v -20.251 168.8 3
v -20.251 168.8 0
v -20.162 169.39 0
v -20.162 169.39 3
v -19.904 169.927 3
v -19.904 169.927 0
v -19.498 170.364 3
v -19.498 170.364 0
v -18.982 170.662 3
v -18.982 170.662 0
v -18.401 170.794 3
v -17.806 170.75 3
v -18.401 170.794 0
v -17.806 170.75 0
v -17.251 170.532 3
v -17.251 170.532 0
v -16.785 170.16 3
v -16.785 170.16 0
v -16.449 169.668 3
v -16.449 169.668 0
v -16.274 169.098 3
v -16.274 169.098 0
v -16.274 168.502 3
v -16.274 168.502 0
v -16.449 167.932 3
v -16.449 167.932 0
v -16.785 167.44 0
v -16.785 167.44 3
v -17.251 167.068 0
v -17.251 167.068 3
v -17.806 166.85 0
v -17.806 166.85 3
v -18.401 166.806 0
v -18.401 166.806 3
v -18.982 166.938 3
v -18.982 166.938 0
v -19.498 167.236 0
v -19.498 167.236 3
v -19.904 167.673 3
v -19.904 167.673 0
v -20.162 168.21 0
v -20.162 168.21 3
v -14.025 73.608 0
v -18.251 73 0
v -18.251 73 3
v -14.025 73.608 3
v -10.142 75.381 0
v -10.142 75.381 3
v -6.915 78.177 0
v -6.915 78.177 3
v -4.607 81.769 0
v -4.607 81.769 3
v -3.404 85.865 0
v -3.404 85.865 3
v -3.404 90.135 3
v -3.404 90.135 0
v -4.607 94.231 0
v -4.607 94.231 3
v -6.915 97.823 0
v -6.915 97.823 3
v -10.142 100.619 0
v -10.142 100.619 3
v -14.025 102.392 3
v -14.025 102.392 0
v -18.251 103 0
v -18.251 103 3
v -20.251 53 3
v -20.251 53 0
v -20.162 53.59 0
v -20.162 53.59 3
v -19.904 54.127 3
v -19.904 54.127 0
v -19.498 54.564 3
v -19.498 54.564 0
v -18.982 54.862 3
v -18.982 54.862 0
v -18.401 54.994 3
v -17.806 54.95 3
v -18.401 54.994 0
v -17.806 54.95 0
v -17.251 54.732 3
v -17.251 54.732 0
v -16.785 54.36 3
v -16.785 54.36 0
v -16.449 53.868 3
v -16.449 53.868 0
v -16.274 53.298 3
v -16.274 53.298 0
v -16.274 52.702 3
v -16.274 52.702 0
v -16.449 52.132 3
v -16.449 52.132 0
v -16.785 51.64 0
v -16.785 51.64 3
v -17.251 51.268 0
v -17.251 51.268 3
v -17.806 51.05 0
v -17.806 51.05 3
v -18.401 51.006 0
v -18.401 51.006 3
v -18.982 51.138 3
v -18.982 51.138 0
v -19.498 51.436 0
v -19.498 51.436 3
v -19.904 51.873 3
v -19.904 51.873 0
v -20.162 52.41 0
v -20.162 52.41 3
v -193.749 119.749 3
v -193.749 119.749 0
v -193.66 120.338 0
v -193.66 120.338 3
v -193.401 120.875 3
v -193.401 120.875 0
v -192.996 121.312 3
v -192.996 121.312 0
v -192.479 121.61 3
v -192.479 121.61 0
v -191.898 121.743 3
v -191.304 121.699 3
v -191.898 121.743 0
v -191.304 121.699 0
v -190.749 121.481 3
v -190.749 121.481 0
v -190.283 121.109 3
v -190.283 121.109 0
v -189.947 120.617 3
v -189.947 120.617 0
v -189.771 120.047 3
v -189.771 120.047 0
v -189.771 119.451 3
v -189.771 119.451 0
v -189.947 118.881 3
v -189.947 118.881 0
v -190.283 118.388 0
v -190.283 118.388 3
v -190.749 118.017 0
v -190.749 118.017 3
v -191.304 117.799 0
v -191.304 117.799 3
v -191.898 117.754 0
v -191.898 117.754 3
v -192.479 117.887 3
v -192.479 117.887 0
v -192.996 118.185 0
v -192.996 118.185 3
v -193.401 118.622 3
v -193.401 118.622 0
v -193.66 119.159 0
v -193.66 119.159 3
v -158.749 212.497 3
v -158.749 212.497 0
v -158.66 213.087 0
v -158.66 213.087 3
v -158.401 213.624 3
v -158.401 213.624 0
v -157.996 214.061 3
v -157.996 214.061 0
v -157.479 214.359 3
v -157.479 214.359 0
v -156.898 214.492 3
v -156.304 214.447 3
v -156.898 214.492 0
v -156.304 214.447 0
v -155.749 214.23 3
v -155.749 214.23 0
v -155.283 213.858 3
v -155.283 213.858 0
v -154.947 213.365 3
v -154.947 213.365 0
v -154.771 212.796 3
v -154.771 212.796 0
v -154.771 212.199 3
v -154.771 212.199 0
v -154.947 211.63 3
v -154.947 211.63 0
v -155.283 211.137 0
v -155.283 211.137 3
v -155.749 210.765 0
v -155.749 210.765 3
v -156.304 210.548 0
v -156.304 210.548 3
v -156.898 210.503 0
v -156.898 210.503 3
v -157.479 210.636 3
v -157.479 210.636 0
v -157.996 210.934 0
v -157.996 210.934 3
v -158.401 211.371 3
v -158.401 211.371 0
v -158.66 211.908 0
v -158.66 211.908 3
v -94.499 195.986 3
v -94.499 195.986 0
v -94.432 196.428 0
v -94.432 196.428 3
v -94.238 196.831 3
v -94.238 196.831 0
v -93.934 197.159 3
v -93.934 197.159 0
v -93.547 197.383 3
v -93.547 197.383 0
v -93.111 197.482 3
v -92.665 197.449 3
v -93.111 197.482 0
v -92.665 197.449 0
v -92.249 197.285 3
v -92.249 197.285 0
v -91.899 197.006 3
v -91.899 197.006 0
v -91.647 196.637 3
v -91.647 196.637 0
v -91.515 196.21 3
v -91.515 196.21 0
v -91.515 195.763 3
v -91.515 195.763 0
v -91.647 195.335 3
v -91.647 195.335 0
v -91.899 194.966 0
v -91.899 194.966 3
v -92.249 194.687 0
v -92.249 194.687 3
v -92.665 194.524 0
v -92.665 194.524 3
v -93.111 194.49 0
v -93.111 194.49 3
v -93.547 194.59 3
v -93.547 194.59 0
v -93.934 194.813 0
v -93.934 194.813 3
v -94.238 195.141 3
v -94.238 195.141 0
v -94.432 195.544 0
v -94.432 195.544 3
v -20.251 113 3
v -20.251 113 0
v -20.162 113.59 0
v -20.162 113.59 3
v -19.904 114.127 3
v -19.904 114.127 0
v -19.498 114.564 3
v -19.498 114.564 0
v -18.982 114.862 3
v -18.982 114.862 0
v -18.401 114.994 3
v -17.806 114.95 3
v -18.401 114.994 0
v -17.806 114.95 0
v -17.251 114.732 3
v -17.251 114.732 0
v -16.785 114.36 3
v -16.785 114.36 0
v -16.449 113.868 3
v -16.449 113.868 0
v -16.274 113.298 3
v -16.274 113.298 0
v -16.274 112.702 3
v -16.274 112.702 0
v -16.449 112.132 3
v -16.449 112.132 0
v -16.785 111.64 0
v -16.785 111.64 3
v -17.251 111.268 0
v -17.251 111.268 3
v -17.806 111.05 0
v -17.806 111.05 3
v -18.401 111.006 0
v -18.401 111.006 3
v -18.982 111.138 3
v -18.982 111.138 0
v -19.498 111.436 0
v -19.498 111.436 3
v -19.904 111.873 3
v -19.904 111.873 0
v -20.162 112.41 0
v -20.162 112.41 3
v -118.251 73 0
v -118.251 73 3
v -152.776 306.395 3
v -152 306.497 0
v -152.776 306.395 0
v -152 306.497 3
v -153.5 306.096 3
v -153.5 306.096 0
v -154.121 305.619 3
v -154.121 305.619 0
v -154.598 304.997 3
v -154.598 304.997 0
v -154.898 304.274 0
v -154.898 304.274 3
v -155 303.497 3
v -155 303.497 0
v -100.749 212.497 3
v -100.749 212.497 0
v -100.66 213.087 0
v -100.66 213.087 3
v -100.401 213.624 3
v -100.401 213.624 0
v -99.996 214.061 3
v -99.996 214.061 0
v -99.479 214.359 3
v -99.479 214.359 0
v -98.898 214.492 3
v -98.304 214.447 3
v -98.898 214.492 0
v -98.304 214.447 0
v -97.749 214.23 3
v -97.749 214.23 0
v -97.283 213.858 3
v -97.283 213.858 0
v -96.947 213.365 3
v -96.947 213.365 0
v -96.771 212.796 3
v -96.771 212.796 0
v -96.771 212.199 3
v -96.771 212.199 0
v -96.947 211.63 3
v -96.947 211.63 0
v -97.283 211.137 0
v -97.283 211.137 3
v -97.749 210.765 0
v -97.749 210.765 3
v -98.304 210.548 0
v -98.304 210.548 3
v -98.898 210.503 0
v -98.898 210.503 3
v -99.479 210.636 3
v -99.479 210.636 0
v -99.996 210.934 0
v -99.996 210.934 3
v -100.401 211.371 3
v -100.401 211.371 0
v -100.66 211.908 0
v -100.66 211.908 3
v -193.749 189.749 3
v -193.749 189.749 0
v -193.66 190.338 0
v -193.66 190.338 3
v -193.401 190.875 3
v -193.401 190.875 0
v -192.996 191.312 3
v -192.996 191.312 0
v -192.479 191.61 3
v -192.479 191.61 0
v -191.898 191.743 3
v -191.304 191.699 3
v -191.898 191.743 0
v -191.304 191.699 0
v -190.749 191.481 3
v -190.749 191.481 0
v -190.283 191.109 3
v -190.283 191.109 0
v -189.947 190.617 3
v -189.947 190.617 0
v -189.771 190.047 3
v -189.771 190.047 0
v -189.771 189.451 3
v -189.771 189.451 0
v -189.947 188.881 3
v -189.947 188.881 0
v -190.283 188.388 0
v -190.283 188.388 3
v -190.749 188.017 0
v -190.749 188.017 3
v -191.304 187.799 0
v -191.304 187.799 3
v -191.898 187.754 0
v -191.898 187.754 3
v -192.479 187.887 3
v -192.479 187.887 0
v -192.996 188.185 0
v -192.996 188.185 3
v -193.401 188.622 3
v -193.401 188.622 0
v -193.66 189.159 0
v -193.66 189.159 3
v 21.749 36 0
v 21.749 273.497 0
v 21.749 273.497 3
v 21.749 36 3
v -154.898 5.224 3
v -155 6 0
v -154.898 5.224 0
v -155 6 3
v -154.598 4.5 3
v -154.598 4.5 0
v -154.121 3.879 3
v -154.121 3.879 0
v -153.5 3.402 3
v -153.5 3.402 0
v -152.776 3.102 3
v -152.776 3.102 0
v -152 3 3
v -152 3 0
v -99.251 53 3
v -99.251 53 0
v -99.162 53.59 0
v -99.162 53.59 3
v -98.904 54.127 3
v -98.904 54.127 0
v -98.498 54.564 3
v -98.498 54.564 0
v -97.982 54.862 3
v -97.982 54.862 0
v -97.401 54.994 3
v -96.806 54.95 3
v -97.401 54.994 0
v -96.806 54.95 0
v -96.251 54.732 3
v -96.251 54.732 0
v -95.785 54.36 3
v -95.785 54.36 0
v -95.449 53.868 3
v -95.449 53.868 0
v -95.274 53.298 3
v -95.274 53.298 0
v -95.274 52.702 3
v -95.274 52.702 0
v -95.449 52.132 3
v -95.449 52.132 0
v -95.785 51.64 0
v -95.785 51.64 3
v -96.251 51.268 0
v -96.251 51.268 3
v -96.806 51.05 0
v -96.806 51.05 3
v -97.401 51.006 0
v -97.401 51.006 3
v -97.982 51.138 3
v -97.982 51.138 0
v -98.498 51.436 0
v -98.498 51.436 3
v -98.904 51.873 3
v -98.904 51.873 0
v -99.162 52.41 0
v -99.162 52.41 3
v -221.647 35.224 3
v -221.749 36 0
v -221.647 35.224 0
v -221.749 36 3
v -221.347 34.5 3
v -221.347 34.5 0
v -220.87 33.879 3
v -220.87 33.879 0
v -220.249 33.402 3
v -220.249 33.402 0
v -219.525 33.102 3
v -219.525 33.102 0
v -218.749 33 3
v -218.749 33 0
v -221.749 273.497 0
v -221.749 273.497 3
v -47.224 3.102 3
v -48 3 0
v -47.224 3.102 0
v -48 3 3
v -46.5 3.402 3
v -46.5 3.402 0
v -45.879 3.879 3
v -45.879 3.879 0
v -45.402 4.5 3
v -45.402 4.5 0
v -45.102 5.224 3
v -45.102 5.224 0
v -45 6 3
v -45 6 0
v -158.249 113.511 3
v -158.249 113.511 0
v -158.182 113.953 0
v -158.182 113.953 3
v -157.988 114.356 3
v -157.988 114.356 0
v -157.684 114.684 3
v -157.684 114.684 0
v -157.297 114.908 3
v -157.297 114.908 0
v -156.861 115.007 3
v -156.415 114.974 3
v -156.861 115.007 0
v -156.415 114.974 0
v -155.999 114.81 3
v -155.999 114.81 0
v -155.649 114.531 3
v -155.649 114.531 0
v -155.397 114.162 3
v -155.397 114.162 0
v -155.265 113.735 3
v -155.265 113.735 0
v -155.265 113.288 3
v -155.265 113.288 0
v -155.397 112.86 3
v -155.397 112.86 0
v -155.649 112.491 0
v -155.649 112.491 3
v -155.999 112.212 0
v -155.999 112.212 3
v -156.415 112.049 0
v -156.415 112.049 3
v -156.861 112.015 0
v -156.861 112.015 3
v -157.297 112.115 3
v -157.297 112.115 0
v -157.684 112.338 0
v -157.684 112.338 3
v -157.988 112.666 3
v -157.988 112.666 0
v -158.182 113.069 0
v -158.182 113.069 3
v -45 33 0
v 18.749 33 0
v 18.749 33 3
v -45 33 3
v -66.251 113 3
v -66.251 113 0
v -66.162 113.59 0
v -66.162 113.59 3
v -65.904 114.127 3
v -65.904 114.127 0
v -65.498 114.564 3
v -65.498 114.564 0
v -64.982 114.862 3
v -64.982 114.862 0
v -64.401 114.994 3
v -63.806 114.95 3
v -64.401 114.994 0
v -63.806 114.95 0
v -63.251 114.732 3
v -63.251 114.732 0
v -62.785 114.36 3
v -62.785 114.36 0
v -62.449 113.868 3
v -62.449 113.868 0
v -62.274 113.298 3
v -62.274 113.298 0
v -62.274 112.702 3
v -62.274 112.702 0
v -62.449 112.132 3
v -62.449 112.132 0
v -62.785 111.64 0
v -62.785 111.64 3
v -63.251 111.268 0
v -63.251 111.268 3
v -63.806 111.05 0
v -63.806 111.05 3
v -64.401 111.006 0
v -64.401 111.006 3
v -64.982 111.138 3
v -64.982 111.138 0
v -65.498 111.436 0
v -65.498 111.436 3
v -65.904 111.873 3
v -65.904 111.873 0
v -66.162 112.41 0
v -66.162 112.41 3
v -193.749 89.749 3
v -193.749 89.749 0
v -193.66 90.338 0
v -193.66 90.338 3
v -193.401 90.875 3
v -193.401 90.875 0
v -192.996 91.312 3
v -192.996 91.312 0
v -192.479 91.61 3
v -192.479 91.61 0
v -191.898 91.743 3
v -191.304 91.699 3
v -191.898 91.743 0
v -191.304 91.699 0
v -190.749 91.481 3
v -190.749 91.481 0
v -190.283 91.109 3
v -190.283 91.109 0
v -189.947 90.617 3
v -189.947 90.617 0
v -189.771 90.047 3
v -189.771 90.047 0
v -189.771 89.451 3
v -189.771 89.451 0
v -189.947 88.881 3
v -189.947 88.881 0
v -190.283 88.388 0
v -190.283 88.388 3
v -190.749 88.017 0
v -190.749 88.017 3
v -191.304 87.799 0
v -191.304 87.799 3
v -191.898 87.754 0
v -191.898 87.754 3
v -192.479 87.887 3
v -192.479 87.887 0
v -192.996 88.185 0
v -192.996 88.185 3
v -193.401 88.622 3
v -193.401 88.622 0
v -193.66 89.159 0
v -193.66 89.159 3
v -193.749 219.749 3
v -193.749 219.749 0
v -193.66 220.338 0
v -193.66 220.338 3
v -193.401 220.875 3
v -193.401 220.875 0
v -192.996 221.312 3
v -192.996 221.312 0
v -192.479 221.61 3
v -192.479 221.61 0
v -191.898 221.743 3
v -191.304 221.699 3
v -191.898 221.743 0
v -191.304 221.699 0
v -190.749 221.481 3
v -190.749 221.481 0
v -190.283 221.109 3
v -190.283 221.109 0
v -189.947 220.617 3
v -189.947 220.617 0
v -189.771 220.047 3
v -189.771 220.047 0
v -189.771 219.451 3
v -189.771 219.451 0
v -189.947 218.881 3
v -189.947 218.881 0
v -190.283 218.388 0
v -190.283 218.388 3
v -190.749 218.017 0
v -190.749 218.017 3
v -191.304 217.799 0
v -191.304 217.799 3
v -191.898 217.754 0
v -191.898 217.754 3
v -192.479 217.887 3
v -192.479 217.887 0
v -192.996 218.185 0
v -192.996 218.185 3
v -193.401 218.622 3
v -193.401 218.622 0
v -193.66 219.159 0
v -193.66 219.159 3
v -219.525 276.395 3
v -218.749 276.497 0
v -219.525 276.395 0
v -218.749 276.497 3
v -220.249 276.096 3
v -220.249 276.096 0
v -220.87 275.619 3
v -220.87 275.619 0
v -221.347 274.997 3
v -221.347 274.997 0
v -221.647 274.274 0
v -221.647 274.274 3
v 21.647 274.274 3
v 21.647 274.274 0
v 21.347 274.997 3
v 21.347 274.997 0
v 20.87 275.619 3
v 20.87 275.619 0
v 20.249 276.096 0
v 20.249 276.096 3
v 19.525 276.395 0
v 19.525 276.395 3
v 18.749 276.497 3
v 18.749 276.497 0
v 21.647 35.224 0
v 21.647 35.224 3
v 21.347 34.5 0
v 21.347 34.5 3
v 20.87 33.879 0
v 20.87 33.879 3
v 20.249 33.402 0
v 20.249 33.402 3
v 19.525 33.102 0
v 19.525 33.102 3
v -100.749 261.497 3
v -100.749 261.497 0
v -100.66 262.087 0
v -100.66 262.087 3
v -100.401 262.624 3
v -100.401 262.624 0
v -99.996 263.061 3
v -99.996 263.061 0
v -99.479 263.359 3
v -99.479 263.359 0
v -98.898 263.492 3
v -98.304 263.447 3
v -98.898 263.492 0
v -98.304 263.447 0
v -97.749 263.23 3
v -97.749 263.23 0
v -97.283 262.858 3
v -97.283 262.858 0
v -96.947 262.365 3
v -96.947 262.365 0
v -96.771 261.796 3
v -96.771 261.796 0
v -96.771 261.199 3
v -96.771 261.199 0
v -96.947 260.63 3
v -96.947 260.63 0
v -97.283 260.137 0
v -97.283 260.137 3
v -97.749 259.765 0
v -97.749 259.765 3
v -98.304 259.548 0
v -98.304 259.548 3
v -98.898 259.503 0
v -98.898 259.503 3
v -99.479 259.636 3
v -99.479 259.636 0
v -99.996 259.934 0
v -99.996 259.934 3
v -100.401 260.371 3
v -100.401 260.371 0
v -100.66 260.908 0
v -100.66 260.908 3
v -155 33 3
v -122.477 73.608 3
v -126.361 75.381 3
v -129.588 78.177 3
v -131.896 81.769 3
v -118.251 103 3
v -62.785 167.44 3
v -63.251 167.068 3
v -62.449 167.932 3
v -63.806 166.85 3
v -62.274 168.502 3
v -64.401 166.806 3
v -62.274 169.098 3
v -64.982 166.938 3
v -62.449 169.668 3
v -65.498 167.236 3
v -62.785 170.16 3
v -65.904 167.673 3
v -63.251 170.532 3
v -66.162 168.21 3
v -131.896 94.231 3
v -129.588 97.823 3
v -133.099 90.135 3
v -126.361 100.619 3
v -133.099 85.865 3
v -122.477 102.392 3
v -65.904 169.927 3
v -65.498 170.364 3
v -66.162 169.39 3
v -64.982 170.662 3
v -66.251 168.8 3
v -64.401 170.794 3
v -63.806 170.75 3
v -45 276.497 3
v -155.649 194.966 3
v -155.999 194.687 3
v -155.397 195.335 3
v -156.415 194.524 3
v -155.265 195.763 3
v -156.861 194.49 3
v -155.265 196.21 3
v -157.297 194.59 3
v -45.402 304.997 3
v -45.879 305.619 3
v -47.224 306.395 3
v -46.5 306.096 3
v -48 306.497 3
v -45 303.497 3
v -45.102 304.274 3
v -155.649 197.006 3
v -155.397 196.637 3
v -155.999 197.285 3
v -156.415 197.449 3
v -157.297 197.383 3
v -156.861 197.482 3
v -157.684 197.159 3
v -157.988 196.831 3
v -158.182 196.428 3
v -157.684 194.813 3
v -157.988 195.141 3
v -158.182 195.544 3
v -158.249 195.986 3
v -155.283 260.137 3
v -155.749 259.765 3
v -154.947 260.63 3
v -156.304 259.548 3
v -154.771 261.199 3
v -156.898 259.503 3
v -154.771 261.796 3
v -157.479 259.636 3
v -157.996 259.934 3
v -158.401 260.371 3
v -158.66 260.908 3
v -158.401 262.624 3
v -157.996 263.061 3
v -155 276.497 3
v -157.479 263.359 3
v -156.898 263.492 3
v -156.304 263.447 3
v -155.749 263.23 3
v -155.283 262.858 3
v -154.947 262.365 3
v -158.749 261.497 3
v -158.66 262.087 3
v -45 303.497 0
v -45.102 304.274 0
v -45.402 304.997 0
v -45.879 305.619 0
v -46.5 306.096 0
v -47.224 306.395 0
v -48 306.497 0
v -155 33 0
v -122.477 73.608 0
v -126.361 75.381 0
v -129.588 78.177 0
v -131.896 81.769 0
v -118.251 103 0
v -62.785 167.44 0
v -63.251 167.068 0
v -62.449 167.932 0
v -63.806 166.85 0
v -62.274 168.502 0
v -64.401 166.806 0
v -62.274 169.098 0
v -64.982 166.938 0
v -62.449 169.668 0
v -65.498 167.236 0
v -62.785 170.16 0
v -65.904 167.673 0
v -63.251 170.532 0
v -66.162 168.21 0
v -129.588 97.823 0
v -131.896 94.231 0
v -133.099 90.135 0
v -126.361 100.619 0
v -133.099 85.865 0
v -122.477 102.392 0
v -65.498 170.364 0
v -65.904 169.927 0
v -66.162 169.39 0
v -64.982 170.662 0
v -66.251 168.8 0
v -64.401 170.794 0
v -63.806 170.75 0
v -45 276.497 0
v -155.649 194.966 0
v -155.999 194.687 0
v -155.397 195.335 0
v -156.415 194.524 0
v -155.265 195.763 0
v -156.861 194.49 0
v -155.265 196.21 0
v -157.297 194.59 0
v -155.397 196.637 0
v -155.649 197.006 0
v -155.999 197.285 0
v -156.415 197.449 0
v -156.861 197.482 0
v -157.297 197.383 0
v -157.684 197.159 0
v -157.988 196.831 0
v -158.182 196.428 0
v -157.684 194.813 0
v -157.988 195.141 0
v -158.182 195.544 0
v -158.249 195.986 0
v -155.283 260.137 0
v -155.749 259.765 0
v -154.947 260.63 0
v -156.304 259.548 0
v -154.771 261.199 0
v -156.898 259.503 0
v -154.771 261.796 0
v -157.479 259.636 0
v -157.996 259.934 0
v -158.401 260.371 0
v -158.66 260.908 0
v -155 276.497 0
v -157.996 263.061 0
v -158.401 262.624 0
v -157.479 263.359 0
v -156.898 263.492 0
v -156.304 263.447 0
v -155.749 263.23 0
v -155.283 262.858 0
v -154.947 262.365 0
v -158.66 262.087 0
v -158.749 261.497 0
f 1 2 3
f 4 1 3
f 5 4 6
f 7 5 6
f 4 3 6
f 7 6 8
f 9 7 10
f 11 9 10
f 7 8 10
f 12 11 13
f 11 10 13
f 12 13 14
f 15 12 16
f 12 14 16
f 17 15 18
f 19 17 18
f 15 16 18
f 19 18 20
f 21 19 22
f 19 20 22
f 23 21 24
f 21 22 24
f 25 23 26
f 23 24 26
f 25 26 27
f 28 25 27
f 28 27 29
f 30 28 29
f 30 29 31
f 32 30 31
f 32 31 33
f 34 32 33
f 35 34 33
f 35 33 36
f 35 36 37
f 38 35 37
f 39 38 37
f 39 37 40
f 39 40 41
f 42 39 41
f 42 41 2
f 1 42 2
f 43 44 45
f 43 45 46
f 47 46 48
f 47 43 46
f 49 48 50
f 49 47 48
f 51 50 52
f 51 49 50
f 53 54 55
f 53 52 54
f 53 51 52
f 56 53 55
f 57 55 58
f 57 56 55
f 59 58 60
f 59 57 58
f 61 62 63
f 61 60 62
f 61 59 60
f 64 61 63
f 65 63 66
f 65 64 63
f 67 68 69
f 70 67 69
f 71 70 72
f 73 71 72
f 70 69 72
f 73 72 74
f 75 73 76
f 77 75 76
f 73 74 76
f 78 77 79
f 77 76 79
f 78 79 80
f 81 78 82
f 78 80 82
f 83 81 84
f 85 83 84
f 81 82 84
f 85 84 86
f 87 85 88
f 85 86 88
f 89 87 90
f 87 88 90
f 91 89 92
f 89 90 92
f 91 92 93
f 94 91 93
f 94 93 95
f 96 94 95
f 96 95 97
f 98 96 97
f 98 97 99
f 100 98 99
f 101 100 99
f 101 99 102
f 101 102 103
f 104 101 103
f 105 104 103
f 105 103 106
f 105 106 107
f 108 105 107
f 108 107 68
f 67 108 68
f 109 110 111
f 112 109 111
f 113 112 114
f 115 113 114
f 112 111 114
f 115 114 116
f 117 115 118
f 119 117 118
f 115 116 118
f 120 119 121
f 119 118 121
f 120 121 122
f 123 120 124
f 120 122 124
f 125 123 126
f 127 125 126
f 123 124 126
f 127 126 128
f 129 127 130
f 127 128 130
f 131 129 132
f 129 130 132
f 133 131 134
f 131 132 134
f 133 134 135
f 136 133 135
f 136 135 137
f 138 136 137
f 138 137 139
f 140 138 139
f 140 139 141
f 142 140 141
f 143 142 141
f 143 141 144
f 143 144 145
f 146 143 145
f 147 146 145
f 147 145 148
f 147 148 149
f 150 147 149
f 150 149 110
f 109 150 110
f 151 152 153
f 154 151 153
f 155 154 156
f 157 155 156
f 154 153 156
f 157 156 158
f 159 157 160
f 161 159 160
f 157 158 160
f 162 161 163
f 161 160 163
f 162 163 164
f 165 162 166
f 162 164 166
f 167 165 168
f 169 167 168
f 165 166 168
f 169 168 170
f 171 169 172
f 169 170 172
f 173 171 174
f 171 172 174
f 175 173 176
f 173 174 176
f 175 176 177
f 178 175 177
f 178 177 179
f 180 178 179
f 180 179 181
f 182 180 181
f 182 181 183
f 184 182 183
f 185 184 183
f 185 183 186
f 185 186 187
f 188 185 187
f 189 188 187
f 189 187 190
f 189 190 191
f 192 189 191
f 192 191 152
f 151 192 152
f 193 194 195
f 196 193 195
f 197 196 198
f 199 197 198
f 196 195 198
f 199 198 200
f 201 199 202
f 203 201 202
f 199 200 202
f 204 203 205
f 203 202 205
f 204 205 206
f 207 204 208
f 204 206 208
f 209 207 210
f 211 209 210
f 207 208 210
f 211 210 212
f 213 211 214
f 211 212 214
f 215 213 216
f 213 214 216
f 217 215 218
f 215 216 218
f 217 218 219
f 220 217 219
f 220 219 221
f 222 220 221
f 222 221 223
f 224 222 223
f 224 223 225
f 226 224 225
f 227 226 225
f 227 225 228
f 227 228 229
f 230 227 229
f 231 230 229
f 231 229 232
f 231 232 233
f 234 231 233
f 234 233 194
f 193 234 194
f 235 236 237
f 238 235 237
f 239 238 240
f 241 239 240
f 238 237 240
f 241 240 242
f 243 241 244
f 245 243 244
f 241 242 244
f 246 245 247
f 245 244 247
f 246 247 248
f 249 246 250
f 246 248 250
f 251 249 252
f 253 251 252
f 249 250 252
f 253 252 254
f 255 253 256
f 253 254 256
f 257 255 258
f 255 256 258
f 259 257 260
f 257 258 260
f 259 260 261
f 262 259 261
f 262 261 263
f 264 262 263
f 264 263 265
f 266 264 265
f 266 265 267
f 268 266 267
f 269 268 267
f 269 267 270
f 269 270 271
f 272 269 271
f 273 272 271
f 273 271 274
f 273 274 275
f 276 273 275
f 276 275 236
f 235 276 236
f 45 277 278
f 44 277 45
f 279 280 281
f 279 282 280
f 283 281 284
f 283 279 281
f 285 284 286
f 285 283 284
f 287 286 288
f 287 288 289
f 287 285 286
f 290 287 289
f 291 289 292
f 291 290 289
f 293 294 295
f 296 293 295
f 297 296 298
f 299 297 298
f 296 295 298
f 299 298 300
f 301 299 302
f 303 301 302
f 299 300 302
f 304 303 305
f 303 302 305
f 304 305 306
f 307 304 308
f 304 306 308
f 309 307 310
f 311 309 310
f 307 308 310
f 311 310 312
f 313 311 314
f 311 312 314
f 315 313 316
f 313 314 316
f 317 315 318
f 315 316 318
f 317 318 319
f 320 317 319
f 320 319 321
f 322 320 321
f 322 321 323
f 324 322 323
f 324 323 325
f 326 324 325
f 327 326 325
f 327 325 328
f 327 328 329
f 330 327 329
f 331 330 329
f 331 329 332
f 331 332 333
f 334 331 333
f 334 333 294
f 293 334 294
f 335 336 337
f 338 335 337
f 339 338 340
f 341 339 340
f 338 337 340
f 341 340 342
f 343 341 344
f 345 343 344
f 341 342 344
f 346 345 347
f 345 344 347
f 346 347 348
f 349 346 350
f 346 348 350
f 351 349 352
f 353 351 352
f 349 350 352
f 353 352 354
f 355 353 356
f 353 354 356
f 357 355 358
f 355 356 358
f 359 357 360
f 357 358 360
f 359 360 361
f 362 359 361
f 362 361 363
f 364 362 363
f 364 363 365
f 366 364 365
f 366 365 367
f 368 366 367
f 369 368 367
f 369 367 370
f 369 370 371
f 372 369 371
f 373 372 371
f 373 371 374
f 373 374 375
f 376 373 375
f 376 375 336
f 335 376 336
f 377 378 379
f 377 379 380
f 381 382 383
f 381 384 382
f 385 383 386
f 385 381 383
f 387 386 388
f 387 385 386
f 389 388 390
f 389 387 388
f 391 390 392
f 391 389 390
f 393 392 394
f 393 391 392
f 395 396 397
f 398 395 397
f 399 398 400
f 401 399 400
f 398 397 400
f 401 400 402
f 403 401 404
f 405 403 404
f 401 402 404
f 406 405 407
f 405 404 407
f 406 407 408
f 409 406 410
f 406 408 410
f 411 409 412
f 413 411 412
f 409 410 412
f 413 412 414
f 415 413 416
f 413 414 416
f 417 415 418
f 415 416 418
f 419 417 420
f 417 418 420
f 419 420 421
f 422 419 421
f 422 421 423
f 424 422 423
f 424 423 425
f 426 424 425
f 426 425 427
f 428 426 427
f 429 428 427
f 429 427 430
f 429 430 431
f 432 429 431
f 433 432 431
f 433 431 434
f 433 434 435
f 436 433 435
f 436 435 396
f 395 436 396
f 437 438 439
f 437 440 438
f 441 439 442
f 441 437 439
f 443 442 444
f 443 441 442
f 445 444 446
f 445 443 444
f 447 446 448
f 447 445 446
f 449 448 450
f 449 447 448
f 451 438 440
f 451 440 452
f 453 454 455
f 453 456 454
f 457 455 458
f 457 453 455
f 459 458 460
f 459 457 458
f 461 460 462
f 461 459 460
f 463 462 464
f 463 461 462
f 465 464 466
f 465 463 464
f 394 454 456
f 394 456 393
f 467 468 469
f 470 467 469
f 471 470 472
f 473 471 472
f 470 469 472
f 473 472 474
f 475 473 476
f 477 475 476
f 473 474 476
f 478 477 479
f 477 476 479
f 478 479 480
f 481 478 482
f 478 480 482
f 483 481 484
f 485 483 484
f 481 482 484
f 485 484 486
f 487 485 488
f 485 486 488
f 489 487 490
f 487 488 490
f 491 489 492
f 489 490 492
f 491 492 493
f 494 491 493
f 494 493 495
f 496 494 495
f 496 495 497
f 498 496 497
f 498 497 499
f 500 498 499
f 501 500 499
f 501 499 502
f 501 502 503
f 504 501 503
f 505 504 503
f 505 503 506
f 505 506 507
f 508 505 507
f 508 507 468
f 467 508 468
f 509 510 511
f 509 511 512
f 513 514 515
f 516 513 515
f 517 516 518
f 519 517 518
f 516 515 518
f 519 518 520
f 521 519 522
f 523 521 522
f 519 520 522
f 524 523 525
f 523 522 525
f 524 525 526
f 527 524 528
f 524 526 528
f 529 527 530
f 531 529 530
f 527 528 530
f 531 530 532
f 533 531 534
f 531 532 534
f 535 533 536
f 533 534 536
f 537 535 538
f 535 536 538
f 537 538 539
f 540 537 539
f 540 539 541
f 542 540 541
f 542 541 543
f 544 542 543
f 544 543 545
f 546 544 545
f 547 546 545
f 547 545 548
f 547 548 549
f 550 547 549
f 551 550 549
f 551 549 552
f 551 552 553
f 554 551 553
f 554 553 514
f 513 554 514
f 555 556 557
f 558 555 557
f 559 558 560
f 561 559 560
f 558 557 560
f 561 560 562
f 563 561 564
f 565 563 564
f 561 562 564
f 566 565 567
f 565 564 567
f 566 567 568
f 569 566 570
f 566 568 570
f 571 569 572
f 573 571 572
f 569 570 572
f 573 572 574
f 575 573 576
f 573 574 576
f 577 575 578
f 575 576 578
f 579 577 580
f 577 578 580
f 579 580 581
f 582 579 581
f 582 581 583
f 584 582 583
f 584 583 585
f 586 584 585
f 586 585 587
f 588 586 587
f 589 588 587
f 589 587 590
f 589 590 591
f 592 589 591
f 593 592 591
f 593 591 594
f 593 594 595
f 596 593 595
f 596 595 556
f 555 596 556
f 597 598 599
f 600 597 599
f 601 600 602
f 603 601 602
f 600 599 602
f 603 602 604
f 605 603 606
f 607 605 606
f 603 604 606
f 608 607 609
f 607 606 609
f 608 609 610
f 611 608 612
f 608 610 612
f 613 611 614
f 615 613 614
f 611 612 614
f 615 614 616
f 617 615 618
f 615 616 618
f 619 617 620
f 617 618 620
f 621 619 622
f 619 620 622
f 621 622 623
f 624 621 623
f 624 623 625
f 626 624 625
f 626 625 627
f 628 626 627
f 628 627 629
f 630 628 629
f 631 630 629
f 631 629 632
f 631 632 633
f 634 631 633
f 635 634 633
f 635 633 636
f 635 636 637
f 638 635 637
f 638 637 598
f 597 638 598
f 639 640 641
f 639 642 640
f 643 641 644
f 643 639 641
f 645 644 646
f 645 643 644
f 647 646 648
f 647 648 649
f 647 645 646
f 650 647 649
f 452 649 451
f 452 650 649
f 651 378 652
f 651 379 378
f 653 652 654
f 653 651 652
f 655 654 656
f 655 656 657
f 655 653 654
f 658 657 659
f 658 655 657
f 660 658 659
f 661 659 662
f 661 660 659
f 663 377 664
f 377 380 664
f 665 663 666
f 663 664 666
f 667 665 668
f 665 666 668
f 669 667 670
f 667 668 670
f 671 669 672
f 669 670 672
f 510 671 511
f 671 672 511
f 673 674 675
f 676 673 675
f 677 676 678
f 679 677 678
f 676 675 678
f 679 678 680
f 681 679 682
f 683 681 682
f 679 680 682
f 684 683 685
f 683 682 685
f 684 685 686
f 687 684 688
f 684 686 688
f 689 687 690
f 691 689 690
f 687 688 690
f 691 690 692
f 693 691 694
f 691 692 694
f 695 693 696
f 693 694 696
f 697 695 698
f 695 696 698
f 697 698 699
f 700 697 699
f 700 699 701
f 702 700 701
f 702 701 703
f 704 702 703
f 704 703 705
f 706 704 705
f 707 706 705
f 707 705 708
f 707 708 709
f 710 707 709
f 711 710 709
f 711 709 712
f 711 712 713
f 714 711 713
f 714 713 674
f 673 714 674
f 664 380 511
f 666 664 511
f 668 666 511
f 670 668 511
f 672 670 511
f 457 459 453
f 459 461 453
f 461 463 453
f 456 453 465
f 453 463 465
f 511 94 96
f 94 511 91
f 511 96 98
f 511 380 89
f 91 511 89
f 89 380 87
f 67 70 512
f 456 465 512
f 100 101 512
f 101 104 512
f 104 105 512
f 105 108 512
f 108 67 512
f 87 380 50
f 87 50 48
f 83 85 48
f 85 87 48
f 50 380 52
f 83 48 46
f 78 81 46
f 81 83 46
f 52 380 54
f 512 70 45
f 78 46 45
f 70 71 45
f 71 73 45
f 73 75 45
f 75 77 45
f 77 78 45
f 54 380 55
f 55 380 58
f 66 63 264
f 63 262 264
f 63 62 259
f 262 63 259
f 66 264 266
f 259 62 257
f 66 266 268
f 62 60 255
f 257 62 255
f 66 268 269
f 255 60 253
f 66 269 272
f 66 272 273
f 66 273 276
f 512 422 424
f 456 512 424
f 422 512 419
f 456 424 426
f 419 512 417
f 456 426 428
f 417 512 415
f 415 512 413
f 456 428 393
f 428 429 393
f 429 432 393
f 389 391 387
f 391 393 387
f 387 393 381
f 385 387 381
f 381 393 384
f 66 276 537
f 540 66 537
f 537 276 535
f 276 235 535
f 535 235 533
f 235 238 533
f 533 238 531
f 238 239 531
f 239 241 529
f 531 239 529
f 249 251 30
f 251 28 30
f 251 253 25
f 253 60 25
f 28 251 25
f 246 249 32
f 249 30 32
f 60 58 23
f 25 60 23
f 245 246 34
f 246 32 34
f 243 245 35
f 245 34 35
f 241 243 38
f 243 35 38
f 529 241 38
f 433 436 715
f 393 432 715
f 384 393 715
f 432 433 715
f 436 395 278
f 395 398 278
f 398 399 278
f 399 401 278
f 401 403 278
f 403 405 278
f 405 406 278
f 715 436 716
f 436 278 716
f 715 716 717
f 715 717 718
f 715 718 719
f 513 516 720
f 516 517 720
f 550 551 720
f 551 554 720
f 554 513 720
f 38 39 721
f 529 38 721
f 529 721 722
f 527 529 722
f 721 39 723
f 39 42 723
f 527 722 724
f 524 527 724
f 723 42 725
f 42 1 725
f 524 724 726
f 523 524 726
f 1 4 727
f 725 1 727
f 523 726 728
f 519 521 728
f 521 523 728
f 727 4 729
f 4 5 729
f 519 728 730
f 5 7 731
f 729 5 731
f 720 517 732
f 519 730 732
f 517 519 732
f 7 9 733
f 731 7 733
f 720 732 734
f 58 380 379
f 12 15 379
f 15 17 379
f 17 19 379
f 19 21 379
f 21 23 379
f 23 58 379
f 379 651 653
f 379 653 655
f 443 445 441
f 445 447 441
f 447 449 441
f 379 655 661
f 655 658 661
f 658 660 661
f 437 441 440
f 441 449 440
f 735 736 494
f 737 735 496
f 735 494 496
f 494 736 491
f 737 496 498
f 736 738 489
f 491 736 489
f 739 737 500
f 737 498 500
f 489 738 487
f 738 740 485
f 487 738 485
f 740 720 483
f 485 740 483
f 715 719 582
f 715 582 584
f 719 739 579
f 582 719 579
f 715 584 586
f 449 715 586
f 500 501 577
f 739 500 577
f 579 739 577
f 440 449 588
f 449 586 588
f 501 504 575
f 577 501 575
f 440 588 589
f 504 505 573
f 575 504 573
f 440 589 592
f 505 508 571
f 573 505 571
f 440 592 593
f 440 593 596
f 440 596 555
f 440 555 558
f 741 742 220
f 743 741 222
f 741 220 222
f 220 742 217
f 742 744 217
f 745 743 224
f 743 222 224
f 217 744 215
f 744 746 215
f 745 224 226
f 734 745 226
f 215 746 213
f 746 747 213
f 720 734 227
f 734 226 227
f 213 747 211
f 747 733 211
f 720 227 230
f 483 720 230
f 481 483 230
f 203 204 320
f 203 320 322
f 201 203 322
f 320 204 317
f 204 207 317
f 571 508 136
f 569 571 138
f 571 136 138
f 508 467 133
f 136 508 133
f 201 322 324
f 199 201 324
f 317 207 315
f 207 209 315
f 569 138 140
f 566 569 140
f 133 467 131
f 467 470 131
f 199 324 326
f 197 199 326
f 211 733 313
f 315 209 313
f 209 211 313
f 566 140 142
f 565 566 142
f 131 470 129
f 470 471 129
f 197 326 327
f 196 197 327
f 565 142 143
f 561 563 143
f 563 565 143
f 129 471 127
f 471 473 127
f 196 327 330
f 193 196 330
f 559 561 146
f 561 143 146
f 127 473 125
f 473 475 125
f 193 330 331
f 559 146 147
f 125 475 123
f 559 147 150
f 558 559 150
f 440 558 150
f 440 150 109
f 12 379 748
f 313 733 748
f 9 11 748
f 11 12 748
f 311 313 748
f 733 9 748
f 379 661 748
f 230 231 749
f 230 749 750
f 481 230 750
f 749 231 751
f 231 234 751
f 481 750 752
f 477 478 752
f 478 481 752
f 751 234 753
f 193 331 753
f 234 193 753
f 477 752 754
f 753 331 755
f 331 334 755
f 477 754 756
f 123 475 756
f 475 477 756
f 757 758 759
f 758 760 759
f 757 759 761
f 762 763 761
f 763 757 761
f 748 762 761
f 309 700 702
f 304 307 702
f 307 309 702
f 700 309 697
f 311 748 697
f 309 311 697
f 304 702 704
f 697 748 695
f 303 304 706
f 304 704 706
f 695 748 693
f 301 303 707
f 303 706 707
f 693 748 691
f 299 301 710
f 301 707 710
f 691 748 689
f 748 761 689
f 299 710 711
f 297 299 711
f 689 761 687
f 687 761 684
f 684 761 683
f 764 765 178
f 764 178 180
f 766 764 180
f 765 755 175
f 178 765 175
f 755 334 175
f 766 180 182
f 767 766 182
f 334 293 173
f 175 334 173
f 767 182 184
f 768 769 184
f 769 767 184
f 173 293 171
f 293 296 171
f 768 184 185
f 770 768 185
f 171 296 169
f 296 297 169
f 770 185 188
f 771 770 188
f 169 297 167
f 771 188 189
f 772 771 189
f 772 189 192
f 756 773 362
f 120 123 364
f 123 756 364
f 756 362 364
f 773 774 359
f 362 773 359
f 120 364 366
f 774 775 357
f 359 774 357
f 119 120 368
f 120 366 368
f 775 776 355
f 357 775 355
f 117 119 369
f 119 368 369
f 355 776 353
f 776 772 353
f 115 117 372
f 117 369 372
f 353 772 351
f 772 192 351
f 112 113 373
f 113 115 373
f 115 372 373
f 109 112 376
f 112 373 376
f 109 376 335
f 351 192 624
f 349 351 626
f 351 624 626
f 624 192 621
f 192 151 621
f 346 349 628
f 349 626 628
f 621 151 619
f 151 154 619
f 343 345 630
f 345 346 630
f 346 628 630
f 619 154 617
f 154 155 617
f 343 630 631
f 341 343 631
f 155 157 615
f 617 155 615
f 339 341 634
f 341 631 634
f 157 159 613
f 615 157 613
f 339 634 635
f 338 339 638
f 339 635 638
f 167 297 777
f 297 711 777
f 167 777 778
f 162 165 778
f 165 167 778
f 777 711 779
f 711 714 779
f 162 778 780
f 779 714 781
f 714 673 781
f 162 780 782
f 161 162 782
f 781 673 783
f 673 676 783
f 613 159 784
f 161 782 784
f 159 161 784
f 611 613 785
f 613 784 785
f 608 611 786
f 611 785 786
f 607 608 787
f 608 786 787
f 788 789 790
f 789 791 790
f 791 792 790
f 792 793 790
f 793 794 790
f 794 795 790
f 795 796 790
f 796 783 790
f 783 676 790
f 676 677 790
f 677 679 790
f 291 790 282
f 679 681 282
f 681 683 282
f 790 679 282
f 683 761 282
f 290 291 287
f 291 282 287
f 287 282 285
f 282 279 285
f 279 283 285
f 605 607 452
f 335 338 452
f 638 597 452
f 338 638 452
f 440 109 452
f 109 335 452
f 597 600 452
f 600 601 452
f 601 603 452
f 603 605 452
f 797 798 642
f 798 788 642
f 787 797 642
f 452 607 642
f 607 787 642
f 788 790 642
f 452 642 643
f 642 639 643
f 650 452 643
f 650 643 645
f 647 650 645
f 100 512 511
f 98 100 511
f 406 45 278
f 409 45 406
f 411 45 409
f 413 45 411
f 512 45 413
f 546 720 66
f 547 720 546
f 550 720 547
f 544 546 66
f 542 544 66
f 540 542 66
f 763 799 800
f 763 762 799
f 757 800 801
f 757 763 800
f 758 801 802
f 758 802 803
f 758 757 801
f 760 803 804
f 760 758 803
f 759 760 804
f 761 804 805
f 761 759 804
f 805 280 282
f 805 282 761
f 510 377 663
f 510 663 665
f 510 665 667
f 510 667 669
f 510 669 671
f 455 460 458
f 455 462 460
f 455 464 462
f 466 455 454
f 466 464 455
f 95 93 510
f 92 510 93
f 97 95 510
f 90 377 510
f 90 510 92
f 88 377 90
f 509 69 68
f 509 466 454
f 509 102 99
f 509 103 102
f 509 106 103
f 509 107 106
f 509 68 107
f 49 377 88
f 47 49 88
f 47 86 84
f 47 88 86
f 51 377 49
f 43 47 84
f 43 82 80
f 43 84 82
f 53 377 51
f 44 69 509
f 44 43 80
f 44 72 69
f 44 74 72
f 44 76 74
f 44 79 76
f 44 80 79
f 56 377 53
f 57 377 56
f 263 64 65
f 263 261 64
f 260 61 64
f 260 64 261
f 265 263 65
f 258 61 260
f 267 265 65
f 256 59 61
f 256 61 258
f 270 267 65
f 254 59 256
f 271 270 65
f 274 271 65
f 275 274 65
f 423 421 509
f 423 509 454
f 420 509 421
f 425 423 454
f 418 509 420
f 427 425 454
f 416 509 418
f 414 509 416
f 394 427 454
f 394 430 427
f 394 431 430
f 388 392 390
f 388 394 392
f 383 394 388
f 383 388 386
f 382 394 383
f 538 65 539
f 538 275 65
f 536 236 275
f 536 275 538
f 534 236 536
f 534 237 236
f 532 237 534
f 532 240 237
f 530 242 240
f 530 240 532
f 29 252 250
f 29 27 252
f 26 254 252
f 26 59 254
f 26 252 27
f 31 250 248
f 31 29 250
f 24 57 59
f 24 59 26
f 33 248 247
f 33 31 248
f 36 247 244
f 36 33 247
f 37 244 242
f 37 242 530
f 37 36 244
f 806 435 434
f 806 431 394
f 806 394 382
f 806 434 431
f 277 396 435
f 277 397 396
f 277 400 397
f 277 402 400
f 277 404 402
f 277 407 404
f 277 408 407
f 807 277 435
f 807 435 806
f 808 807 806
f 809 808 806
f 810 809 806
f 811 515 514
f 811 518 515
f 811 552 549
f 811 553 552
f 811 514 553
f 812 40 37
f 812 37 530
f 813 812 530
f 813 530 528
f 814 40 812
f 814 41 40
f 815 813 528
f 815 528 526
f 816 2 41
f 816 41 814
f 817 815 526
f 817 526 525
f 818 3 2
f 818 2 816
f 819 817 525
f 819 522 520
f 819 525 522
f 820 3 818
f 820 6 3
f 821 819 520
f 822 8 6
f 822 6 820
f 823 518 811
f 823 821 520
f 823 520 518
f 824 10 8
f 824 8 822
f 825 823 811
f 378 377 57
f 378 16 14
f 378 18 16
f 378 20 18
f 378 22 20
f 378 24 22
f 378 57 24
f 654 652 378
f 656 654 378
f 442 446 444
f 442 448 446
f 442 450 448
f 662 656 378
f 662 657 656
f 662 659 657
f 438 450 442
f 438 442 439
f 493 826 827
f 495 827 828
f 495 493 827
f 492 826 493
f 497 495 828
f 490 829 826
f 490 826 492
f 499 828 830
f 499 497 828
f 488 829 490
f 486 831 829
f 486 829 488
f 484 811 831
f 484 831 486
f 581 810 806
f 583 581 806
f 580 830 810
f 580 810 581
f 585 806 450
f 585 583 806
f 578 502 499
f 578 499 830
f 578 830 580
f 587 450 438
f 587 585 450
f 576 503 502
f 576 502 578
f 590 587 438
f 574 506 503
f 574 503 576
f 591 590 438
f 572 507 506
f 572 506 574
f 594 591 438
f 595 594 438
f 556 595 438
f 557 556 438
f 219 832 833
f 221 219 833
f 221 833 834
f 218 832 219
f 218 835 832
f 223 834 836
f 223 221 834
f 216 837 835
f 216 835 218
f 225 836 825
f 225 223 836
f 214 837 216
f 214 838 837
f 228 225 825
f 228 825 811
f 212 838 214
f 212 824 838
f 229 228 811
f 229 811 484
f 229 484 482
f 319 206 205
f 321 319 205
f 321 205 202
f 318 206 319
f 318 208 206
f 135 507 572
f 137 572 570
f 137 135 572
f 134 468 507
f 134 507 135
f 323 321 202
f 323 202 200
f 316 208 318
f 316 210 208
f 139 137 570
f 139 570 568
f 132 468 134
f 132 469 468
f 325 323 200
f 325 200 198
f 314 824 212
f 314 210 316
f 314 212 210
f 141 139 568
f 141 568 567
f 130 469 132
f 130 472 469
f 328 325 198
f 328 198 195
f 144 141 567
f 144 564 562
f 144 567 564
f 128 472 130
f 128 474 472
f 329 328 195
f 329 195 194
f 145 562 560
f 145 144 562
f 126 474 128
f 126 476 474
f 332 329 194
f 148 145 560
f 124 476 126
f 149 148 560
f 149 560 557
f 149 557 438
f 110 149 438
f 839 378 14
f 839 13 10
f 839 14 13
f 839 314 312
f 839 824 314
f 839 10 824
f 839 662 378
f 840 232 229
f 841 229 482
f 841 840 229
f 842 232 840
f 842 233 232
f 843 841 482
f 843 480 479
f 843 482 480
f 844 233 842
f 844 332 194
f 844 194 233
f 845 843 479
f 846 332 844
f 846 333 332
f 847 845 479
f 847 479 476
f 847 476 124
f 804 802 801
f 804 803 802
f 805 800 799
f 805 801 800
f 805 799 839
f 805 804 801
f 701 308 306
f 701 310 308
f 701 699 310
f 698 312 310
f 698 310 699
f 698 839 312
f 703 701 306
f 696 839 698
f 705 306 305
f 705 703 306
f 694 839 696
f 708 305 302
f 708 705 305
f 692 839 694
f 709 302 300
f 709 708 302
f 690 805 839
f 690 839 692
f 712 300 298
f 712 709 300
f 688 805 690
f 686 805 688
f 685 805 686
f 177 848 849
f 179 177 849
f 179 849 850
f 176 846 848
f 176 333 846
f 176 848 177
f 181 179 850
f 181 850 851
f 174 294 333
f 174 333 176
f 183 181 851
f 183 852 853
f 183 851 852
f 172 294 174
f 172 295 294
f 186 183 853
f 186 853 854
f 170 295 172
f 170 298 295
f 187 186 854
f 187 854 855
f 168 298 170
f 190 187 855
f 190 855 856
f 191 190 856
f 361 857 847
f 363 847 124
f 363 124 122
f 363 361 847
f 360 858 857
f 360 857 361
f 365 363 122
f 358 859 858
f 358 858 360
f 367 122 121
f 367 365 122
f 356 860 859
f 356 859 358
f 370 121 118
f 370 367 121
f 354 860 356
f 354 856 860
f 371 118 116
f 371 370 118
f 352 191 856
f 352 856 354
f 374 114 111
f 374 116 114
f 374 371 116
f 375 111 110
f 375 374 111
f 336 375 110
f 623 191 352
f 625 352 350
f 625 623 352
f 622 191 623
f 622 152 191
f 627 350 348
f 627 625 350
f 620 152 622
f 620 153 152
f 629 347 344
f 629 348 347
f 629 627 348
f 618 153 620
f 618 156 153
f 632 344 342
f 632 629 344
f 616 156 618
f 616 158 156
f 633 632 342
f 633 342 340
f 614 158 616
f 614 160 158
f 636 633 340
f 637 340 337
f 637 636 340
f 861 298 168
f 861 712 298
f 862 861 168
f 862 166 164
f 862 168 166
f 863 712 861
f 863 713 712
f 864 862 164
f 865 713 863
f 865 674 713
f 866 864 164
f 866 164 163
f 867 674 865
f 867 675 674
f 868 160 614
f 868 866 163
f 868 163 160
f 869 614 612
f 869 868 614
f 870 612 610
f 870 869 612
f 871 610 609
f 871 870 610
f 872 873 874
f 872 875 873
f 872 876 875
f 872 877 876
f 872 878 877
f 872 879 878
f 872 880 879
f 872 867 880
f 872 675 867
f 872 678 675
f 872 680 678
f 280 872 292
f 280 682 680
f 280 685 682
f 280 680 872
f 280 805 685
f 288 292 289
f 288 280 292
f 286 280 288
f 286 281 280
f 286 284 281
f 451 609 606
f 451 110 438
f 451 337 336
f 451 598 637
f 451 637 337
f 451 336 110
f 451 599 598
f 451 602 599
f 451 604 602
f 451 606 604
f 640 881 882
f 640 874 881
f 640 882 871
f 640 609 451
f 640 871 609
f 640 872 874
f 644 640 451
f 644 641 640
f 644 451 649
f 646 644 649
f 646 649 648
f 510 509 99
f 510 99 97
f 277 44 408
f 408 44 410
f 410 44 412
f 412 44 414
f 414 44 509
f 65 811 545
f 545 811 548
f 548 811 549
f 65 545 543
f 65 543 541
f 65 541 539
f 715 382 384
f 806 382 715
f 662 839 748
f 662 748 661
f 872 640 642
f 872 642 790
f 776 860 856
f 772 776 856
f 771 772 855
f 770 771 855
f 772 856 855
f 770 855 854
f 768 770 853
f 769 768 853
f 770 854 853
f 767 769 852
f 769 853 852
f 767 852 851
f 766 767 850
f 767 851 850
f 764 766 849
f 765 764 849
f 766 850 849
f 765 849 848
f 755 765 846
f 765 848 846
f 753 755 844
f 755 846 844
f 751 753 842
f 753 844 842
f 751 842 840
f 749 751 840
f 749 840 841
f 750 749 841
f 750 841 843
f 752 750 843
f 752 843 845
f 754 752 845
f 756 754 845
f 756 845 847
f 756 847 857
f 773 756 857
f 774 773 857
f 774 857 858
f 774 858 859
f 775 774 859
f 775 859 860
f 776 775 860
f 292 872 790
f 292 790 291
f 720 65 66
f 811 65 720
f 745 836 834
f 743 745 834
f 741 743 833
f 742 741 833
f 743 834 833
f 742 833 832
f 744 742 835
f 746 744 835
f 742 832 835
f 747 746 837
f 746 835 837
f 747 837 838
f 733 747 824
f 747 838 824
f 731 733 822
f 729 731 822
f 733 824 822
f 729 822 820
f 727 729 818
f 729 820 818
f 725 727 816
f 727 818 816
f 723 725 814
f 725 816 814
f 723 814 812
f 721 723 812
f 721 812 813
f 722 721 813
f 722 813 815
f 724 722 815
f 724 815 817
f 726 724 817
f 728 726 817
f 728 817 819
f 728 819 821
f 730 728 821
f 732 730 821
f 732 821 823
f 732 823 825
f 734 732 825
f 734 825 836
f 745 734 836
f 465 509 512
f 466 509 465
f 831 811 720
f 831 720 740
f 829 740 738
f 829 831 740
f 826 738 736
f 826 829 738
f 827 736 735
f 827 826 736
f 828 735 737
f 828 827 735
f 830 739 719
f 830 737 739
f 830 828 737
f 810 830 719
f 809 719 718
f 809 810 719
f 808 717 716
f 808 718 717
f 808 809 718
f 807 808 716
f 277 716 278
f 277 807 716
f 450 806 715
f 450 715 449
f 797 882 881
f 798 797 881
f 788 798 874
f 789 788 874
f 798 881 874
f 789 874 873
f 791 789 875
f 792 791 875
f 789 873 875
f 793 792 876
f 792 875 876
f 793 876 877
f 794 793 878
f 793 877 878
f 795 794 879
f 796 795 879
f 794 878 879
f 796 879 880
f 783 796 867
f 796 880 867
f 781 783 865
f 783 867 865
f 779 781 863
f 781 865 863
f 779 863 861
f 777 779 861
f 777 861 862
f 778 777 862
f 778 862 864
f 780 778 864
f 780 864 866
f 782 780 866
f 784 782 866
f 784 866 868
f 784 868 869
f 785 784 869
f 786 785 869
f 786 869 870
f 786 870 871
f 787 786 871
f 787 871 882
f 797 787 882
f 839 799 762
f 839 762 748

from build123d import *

# Parameters (mm, degrees)
BASE_DEPTH              = 3
CONG_1_R                = 3
ENL_V_MAT_EXTRU_1_DEPTH = 4
CONG_2_R                = 3
ESQUISSE26_R            = 2
ENL_V_MAT_EXTRU_2_DEPTH = 4
ESQUISSE27_R            = 2
ENL_V_MAT_EXTRU_3_DEPTH = 4
ESQUISSE28_R            = 1.5
ENL_V_MAT_EXTRU_4_DEPTH = 4
ESQUISSE29_R            = 2
ENL_V_MAT_EXTRU_5_DEPTH = 4
ESQUISSE30_R            = 2
ENL_V_MAT_EXTRU_6_DEPTH = 4
ENL_V_MAT_EXTRU_7_DEPTH = 4


with BuildPart() as part:
    # Esquisse1 → Base (new body)
    with BuildSketch(Plane.XY):
        Polygon((0, 0), (-200, 0), (-224.748737342, 24.748737342), (-224.748737342, 284.748737342), (-200, 309.497474683), (0, 309.497474683), (24.748737342, 284.748737342), (24.748737342, 24.748737342), align=None)
    extrude(amount=BASE_DEPTH)

    # Congé1
    cong_1_edges = [part.edges().sort_by_distance(p)[0] for p in [
        (0, 0, 1.5),
        (-200, 0, 1.5),
        (-224.748737342, 24.748737342, 1.5),
        (-224.748737342, 284.748737342, 1.5),
        (-200, 309.497474683, 1.5),
        (0, 309.497474683, 1.5),
        (24.748737342, 284.748737342, 1.5),
        (24.748737342, 24.748737342, 1.5),
    ]]
    fillet(cong_1_edges, radius=CONG_1_R)

    # Esquisse25 → Enlèv. mat.-Extru.1 (cut, through all)
    with BuildSketch(Plane(origin=(0, 0, 0), x_dir=(-1, 0, 0), z_dir=(0, 0, -1))):
        Polygon((-24.748737342, 33), (-24.748737342, 0), (45, 0), (155, 0), (224.748737342, 0), (224.748737342, 33), (224.748737342, 276.497474683), (224.748737342, 309.497474683), (155, 309.497474683), (45, 309.497474683), (-24.748737342, 309.497474683), (-24.748737342, 276.497474683), align=None)
        Polygon((-21.748737342, 33), (45, 33), (45, 3), (155, 3), (155, 33), (221.748737342, 33), (221.748737342, 276.497474683), (155, 276.497474683), (155, 306.497474683), (45, 306.497474683), (45, 276.497474683), (-21.748737342, 276.497474683), align=None, mode=Mode.SUBTRACT)
    extrude(amount=-ENL_V_MAT_EXTRU_1_DEPTH, mode=Mode.SUBTRACT)

    # Congé2
    cong_2_edges = [part.edges().sort_by_distance(p)[0] for p in [
        (21.748737342, 33, 1.5),
        (21.748737342, 276.497474683, 1.5),
        (-45, 306.497474683, 1.5),
        (-155, 306.497474683, 1.5),
        (-221.748737342, 276.497474683, 1.5),
        (-221.748737342, 33, 1.5),
        (-155, 3, 1.5),
        (-45, 3, 1.5),
    ]]
    fillet(cong_2_edges, radius=CONG_2_R)

    # Esquisse26 → Enlèv. mat.-Extru.2 (cut, through all)
    with BuildSketch(Plane(origin=(0, 0, 0), x_dir=(-1, 0, 0), z_dir=(0, 0, -1))):
        with Locations((191.748737342, 189.748737342)):
            Circle(ESQUISSE26_R)
        with Locations((191.748737342, 219.748737342)):
            Circle(ESQUISSE26_R)
        with Locations((191.748737342, 89.748737342)):
            Circle(ESQUISSE26_R)
        with Locations((191.748737342, 119.748737342)):
            Circle(ESQUISSE26_R)
    extrude(amount=-ENL_V_MAT_EXTRU_2_DEPTH, mode=Mode.SUBTRACT)

    # Esquisse27 → Enlèv. mat.-Extru.3 (cut, through all)
    with BuildSketch(Plane(origin=(0, 0, 0), x_dir=(-1, 0, 0), z_dir=(0, 0, -1))):
        with Locations((97.251262658, 53)):
            Circle(ESQUISSE27_R)
        with Locations((18.251262658, 53)):
            Circle(ESQUISSE27_R)
    extrude(amount=-ENL_V_MAT_EXTRU_3_DEPTH, mode=Mode.SUBTRACT)

    # Esquisse28 → Enlèv. mat.-Extru.4 (cut, through all)
    with BuildSketch(Plane(origin=(0, 0, 0), x_dir=(-1, 0, 0), z_dir=(0, 0, -1))):
        with Locations((156.748737342, 195.986237342)):
            Circle(ESQUISSE28_R)
        with Locations((92.998737342, 195.986237342)):
            Circle(ESQUISSE28_R)
        with Locations((156.748737342, 113.511237342)):
            Circle(ESQUISSE28_R)
    extrude(amount=-ENL_V_MAT_EXTRU_4_DEPTH, mode=Mode.SUBTRACT)

    # Esquisse29 → Enlèv. mat.-Extru.5 (cut, through all)
    with BuildSketch(Plane(origin=(0, 0, 0), x_dir=(-1, 0, 0), z_dir=(0, 0, -1))):
        with Locations((156.748737342, 212.497474683)):
            Circle(ESQUISSE29_R)
        with Locations((98.748737342, 212.497474683)):
            Circle(ESQUISSE29_R)
        with Locations((98.748737342, 261.497474683)):
            Circle(ESQUISSE29_R)
        with Locations((156.748737342, 261.497474683)):
            Circle(ESQUISSE29_R)
    extrude(amount=-ENL_V_MAT_EXTRU_5_DEPTH, mode=Mode.SUBTRACT)

    # Esquisse30 → Enlèv. mat.-Extru.6 (cut, through all)
    with BuildSketch(Plane(origin=(0, 0, 0), x_dir=(-1, 0, 0), z_dir=(0, 0, -1))):
        with Locations((64.251262658, 113)):
            Circle(ESQUISSE30_R)
        with Locations((18.251262658, 113)):
            Circle(ESQUISSE30_R)
        with Locations((18.251262658, 168.8)):
            Circle(ESQUISSE30_R)
        with Locations((64.251262658, 168.8)):
            Circle(ESQUISSE30_R)
    extrude(amount=-ENL_V_MAT_EXTRU_6_DEPTH, mode=Mode.SUBTRACT)

    # Esquisse31 → Enlèv. mat.-Extru.7 (cut, through all)
    with BuildSketch(Plane(origin=(0, 0, 0), x_dir=(-1, 0, 0), z_dir=(0, 0, -1))):
        with BuildLine():
            Line((118.251262658, 73), (18.251262658, 73))
            ThreePointArc((18.251262658, 73), (3.251262658, 88), (18.251262658, 103))
            Line((18.251262658, 103), (118.251262658, 103))
            ThreePointArc((118.251262658, 103), (133.251262658, 88), (118.251262658, 73))
        make_face()
    extrude(amount=-ENL_V_MAT_EXTRU_7_DEPTH, mode=Mode.SUBTRACT)


solid = part.part
